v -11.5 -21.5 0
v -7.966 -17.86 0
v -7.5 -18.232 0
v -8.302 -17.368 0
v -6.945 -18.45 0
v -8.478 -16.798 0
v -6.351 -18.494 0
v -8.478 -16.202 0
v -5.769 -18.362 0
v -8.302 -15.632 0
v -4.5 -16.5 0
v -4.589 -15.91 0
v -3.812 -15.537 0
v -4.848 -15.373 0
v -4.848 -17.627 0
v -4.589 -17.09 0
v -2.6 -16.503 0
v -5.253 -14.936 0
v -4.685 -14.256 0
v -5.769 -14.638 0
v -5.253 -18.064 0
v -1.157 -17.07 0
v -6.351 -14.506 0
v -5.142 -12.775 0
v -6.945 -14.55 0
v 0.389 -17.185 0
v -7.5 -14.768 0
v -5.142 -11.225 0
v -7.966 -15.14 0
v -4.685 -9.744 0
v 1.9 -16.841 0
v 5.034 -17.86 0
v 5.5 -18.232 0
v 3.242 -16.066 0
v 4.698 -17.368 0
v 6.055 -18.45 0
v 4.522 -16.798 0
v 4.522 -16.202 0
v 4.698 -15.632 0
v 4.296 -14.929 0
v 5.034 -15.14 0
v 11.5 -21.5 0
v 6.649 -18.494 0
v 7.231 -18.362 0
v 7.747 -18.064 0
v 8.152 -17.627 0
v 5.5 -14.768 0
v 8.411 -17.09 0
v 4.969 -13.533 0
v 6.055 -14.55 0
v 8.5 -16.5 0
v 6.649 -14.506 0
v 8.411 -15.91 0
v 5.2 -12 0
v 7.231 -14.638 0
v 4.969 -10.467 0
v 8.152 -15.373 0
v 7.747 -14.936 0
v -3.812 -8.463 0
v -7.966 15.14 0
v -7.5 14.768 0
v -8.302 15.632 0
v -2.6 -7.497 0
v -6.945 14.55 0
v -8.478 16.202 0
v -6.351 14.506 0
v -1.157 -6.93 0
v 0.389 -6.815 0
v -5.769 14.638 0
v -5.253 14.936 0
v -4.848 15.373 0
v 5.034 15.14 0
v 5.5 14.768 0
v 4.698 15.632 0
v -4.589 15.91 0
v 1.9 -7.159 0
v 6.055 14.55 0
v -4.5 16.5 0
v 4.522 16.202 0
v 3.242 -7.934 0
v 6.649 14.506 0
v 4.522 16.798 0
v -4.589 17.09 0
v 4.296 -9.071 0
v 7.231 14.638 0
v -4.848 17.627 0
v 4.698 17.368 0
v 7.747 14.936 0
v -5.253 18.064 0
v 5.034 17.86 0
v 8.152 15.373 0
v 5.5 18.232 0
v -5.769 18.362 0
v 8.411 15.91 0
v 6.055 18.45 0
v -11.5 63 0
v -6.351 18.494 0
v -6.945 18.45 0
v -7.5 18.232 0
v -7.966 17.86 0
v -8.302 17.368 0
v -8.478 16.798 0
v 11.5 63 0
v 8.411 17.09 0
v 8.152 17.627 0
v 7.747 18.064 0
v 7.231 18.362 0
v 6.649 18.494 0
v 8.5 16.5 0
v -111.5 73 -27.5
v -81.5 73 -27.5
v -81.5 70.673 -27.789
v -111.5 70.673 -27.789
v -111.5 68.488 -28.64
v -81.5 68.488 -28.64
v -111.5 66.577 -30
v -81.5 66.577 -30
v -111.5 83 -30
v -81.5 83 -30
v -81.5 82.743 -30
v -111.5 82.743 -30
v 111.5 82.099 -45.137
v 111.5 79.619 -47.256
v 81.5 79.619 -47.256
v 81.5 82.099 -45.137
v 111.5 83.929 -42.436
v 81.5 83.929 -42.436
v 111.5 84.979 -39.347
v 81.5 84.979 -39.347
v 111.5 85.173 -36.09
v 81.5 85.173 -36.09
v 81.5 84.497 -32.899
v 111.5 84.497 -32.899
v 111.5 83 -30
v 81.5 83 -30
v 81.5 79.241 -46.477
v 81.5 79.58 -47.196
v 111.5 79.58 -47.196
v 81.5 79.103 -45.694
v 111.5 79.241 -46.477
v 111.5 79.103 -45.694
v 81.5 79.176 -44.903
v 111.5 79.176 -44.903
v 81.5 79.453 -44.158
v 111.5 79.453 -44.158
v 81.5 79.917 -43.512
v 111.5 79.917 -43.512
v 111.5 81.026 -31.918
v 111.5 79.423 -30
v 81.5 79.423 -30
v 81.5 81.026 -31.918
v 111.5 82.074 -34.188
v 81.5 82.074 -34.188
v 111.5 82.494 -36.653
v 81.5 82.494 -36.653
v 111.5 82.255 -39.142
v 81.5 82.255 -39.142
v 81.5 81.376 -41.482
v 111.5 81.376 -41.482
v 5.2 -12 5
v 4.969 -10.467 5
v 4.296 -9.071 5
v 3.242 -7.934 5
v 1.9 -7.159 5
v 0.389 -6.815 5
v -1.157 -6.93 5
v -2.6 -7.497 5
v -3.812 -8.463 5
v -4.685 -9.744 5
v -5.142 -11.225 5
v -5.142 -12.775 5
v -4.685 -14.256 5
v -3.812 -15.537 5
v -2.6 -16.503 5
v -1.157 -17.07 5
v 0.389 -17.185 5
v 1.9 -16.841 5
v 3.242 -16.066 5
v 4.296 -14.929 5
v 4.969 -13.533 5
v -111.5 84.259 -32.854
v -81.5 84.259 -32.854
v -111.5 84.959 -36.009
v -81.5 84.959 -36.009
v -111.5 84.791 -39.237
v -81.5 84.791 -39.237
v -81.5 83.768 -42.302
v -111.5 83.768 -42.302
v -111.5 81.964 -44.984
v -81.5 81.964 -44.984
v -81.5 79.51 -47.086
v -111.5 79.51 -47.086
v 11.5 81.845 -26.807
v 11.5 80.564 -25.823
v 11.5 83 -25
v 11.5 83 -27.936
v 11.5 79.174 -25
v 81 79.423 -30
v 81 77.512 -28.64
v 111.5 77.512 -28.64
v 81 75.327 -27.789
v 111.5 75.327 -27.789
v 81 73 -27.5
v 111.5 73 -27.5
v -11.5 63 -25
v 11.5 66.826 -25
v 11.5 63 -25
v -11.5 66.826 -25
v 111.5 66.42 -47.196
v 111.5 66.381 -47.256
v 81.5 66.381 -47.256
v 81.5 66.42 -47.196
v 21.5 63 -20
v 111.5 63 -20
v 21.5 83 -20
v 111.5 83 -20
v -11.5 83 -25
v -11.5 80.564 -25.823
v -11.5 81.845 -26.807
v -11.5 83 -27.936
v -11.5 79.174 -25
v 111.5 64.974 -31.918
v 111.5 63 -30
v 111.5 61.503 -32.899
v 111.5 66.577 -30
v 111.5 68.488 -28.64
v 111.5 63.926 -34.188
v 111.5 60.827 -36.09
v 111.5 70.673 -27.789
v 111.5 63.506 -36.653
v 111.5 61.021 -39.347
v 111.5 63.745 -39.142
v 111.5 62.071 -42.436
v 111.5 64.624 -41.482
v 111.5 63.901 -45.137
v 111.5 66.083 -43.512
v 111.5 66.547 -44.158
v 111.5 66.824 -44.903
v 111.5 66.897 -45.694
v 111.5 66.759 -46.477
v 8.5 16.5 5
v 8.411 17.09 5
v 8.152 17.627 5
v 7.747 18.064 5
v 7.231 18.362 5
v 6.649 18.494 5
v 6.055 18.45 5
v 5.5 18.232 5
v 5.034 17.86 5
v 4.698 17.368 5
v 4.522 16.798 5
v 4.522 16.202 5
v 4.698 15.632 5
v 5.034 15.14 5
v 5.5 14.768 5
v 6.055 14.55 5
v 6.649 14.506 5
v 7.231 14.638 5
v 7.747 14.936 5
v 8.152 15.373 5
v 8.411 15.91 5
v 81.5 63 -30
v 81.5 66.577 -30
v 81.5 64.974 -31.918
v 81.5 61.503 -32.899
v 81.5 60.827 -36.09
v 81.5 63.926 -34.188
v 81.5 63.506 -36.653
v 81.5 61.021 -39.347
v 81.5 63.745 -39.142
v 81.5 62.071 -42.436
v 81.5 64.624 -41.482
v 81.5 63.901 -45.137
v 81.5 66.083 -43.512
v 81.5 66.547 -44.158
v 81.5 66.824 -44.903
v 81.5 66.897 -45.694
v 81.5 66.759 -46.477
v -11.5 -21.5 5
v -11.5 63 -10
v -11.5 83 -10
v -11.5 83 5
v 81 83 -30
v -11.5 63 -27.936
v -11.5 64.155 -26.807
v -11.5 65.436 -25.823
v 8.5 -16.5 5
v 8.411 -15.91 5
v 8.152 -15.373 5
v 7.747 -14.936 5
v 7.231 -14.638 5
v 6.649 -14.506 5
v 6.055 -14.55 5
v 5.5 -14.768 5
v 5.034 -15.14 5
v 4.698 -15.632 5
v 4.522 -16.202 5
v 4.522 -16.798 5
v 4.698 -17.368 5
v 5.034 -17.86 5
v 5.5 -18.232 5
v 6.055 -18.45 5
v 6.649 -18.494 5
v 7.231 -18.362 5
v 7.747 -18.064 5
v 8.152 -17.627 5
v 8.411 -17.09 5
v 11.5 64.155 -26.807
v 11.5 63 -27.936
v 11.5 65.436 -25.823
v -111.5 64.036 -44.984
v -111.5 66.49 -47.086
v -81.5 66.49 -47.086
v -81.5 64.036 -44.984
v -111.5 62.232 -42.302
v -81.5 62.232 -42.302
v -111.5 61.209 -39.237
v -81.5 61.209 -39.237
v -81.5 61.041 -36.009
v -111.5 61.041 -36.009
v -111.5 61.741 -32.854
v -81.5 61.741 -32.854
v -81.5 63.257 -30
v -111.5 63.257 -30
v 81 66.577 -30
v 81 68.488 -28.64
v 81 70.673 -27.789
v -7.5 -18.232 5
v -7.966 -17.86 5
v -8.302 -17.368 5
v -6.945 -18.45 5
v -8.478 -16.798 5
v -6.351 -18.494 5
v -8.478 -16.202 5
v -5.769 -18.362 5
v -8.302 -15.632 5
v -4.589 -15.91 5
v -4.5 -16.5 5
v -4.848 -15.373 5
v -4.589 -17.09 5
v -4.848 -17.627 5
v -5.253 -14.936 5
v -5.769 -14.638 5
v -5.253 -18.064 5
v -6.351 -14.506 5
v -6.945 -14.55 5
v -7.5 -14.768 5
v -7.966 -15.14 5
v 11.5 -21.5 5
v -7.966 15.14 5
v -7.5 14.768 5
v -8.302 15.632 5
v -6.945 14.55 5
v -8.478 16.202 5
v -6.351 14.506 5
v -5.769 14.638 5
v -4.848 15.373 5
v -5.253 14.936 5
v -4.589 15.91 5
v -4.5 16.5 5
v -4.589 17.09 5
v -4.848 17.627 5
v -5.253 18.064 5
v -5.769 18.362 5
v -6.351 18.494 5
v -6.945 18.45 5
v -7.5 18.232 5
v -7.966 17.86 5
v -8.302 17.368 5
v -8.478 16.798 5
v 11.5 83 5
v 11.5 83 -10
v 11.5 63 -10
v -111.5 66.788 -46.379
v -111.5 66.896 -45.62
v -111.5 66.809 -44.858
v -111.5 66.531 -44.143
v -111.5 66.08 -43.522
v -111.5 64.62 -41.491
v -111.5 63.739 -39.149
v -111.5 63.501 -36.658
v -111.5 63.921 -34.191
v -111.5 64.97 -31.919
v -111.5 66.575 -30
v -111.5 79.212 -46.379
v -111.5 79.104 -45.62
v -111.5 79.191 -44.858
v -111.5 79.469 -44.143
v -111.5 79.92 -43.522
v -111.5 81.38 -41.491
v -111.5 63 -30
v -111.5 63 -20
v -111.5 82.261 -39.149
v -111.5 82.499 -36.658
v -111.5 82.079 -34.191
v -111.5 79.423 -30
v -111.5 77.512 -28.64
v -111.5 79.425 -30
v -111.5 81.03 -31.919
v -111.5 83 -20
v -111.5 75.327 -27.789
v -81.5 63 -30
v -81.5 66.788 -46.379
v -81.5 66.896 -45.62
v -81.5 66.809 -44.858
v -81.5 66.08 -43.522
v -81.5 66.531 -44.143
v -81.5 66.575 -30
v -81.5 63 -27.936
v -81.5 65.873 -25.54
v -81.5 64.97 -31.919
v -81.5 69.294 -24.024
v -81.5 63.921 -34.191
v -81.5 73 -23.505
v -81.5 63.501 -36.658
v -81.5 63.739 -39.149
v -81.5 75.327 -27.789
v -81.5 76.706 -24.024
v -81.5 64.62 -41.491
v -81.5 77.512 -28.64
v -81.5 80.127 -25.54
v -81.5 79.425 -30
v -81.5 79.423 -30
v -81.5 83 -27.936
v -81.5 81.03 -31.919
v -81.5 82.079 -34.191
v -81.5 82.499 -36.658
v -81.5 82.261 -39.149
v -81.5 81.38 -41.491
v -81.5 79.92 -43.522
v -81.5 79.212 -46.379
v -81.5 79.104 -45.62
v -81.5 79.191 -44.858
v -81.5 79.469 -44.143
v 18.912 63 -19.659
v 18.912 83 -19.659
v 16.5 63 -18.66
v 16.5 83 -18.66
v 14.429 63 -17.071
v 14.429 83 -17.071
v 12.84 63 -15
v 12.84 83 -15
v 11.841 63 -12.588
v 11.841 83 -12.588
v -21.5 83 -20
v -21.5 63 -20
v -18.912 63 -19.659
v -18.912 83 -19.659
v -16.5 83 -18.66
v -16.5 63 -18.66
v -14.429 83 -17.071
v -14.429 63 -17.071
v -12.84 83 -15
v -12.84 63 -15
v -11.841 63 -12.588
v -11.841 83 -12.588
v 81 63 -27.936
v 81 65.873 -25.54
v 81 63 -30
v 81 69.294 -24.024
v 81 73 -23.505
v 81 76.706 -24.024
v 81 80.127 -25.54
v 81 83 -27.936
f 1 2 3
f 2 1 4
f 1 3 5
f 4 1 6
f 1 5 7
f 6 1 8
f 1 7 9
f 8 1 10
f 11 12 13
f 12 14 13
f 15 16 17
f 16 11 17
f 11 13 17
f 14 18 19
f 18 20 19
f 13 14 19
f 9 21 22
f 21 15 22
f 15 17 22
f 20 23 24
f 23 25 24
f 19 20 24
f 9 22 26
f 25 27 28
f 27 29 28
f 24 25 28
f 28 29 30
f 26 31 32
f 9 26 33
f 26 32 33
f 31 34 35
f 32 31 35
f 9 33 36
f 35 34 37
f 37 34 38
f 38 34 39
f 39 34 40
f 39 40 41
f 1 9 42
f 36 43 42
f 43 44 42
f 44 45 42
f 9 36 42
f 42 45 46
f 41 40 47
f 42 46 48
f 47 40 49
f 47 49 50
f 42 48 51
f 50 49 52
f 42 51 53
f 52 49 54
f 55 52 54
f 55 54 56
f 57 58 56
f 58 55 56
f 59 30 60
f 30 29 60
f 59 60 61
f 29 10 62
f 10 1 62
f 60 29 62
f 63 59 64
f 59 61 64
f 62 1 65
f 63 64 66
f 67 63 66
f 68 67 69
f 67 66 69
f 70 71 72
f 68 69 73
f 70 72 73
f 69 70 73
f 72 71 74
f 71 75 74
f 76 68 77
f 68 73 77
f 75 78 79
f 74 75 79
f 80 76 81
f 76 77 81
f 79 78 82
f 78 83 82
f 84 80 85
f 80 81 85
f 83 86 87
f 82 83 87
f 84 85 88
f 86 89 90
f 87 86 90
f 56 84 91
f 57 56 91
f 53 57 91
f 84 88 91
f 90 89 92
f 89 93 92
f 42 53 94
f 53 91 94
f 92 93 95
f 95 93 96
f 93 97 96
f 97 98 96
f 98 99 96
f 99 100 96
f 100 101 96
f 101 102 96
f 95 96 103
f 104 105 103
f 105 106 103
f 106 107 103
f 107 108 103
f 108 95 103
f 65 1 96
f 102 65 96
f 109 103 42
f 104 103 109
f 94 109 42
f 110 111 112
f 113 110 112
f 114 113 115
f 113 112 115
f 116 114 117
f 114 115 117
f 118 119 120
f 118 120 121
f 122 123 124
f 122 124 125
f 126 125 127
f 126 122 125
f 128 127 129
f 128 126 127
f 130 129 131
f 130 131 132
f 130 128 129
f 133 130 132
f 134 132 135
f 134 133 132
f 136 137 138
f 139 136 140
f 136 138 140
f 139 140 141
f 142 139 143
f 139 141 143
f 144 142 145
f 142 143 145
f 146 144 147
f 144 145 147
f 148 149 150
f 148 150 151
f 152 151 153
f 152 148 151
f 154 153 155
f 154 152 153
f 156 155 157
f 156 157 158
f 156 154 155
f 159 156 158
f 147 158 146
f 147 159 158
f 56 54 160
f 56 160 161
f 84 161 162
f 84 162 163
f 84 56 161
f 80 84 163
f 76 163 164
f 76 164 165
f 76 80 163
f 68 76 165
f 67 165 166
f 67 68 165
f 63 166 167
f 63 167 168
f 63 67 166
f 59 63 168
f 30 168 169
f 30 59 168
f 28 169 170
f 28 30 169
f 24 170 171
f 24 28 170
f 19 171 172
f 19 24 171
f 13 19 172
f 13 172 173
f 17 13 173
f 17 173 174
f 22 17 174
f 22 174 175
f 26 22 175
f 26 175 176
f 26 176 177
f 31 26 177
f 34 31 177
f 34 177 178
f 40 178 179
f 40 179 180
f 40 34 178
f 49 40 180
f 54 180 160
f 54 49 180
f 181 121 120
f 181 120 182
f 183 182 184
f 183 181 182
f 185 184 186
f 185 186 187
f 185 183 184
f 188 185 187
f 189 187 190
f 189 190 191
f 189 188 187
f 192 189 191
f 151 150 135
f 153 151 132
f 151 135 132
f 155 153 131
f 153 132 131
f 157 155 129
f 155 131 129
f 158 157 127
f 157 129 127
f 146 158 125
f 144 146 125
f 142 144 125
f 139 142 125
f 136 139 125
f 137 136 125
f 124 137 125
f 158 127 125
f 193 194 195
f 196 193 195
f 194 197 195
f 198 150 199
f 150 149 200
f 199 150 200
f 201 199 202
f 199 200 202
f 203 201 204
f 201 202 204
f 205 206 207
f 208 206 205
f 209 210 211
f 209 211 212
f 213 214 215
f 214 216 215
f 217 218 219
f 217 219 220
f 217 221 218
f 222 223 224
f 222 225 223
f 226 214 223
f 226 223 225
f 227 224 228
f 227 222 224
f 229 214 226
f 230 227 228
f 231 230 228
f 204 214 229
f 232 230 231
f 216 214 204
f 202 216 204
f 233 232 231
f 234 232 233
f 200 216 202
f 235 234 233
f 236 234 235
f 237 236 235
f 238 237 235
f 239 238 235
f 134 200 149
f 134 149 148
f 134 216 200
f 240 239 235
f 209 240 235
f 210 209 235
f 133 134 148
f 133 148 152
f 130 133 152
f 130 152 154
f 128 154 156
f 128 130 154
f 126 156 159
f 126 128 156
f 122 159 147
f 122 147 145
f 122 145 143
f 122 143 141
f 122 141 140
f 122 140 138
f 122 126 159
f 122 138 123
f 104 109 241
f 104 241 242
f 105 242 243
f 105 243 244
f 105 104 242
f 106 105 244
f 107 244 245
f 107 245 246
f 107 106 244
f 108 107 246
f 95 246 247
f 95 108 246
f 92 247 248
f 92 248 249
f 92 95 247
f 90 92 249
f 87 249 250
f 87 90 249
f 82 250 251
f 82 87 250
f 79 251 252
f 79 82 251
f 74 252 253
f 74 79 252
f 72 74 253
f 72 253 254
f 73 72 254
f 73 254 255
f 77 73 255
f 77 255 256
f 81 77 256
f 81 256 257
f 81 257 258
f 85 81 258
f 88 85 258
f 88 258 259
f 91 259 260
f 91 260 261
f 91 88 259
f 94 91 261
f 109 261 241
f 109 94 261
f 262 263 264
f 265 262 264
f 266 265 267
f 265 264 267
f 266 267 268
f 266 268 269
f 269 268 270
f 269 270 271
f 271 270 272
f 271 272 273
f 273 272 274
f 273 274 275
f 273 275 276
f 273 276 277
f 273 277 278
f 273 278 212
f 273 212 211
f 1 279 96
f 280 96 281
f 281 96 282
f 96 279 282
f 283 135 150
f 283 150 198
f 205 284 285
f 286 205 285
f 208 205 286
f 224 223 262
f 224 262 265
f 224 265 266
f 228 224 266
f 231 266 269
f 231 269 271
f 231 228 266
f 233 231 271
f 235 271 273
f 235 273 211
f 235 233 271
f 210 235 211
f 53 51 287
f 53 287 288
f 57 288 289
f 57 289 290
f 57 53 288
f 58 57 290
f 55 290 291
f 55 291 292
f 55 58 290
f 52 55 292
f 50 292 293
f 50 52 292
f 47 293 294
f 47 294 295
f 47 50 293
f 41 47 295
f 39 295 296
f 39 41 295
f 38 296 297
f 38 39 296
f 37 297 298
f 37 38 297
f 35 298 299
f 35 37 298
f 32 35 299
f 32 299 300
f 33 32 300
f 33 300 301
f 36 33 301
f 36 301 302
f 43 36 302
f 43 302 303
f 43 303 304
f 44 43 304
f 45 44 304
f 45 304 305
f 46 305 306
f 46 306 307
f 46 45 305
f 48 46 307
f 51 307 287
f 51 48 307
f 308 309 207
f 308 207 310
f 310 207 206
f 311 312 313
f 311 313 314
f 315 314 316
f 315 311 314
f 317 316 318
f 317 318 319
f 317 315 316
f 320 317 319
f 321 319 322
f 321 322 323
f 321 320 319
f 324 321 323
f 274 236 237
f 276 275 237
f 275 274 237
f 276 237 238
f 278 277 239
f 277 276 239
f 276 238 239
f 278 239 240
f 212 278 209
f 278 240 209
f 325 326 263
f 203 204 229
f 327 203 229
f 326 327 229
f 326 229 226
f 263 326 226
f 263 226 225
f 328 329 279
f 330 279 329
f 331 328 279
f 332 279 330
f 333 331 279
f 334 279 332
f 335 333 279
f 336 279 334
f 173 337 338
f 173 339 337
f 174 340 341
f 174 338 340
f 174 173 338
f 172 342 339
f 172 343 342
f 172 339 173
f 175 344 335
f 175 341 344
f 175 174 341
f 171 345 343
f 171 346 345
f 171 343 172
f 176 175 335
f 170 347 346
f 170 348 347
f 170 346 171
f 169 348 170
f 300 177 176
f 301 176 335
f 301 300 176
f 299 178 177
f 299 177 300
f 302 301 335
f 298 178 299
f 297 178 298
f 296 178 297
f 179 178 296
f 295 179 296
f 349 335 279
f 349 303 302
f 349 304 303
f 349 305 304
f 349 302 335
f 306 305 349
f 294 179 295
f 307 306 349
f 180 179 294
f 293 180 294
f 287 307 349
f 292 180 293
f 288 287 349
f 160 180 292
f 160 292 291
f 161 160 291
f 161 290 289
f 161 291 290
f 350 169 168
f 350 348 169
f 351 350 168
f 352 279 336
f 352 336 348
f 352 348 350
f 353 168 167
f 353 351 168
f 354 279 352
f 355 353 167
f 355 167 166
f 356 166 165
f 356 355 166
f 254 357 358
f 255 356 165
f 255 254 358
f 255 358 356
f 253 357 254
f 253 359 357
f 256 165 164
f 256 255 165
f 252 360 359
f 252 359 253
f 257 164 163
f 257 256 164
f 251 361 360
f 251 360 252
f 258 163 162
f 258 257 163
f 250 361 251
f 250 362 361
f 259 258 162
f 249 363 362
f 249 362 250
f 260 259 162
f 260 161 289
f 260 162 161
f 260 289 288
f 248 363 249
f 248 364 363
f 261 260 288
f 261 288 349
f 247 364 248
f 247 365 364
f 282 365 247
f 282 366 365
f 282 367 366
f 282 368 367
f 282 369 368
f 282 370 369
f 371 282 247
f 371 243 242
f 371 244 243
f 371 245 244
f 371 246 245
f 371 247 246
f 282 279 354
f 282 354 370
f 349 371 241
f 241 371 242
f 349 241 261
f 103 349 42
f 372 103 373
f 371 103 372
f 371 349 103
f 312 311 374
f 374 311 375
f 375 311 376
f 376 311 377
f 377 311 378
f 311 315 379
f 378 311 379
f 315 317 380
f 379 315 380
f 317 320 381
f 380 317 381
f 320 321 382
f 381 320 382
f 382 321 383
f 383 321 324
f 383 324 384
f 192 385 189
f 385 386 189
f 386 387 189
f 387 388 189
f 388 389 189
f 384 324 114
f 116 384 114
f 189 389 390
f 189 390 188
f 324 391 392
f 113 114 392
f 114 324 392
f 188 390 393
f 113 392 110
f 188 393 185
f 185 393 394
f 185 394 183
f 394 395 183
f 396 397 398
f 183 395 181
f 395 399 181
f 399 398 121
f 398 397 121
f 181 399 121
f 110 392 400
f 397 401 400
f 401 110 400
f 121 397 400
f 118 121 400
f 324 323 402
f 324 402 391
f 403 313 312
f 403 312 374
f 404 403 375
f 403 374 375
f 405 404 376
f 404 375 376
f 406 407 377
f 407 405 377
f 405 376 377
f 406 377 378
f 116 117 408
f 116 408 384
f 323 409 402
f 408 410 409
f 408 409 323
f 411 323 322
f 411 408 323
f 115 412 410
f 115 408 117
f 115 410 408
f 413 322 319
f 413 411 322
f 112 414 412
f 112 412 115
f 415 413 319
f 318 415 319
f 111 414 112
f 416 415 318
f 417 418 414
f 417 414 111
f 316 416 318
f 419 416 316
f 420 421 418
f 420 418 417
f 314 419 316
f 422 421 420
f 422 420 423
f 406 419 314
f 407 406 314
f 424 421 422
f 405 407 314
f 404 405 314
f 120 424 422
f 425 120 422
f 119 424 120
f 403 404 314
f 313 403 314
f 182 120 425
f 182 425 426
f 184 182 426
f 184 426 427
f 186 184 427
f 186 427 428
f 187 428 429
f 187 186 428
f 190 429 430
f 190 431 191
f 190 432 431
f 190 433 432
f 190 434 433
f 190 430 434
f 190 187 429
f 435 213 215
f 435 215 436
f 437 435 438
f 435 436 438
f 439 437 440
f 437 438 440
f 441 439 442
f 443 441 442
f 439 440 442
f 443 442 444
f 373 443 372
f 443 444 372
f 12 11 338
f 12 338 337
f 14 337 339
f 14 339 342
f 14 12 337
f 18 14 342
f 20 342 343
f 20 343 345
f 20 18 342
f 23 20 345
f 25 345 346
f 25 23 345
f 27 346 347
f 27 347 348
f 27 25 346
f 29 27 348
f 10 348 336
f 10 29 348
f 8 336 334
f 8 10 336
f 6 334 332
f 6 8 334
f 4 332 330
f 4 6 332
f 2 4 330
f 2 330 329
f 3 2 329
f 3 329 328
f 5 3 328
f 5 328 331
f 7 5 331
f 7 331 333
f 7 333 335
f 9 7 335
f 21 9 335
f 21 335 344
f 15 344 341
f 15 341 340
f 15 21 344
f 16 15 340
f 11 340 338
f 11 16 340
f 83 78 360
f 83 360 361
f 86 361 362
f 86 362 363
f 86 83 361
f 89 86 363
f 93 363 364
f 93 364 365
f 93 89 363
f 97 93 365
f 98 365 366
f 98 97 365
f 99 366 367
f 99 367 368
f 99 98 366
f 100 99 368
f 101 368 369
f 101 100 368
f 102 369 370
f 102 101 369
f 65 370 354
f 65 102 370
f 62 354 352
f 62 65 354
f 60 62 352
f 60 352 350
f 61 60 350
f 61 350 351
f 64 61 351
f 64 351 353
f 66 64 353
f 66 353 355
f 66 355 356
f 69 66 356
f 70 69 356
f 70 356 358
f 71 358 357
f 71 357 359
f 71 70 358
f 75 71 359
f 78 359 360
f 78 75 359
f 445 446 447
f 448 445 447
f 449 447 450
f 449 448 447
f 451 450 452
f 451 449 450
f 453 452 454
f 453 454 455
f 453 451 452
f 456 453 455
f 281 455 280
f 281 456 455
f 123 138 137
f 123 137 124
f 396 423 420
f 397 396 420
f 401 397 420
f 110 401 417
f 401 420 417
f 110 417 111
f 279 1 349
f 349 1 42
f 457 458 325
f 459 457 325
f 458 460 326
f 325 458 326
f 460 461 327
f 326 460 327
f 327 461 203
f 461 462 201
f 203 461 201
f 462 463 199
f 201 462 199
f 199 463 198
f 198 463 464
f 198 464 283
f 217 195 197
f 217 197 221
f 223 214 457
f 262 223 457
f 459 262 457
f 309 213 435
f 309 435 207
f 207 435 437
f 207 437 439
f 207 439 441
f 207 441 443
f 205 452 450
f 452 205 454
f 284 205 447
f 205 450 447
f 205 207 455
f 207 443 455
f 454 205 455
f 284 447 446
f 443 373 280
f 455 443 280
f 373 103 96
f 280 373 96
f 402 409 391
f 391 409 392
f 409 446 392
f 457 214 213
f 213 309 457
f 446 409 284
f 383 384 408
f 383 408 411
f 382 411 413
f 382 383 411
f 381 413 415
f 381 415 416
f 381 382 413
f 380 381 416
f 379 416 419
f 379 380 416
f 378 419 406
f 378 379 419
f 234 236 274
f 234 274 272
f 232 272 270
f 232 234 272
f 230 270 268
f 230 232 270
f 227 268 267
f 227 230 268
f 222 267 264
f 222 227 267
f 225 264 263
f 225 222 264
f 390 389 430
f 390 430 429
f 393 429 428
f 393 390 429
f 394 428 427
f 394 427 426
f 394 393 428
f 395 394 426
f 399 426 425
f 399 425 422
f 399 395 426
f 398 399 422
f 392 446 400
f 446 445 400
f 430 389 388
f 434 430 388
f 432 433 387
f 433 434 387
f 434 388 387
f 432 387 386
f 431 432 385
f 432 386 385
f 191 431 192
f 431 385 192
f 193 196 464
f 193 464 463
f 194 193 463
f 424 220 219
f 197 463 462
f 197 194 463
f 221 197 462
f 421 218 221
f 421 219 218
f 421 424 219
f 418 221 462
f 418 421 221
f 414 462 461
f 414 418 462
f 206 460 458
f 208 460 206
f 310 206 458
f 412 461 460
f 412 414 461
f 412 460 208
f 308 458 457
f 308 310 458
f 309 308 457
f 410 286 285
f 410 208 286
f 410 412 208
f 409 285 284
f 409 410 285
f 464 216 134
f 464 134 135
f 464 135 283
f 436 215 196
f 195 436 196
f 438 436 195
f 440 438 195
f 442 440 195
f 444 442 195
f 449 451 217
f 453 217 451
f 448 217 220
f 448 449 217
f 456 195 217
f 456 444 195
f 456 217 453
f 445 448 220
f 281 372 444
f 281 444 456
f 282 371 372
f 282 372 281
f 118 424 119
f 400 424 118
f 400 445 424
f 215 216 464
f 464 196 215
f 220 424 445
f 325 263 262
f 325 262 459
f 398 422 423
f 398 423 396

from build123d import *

# Parameters (mm, degrees)
SKETCH1_W           = 23
SKETCH1_H           = 104.5
SKETCH1_R           = 2
SKETCH1_R_2         = 5.2
BOSS_EXTRUDE1_DEPTH = 5
SKETCH2_W           = 23
SKETCH2_H           = 20
BOSS_EXTRUDE2_DEPTH = 20
SKETCH3_W           = 23
SKETCH3_H           = 20
BOSS_EXTRUDE3_DEPTH = 5
SKETCH3_3_W         = 100
SKETCH3_3_H         = 20
BOSS_EXTRUDE4_DEPTH = 10
BOSS_EXTRUDE5_DEPTH = 30
BOSS_EXTRUDE6_DEPTH = 30
FILLET1_R           = 10
CUT_EXTRUDE1_DEPTH  = 300
SKETCH6_R           = 13.5
CUT_EXTRUDE2_DEPTH  = 162.5
FILLET5_R           = 3


with BuildPart() as part:
    # Sketch1 → Boss-Extrude1 (new body)
    with BuildSketch(Plane.XY):
        with Locations((0, 30.75)):
            Rectangle(SKETCH1_W, SKETCH1_H)
        with Locations((6.5, 16.5)):
            Circle(SKETCH1_R, mode=Mode.SUBTRACT)
        with Locations((6.5, -16.5)):
            Circle(SKETCH1_R, mode=Mode.SUBTRACT)
        with Locations((0, -12)):
            Circle(SKETCH1_R_2, mode=Mode.SUBTRACT)
        with Locations((-6.5, -16.5)):
            Circle(SKETCH1_R, mode=Mode.SUBTRACT)
        with Locations((-6.5, 16.5)):
            Circle(SKETCH1_R, mode=Mode.SUBTRACT)
    extrude(amount=BOSS_EXTRUDE1_DEPTH)

    # Sketch2 → Boss-Extrude2 (add)
    with BuildSketch(Plane(origin=(0, 0, 0), x_dir=(-1, 0, 0), z_dir=(0, 0, -1))):
        with Locations((0, 73)):
            Rectangle(SKETCH2_W, SKETCH2_H)
    extrude(amount=BOSS_EXTRUDE2_DEPTH)

    # Sketch3 → Boss-Extrude3 (add)
    with BuildSketch(Plane(origin=(0, 0, -20), x_dir=(-1, 0, 0), z_dir=(0, 0, -1))):
        with Locations((0, 73)):
            Rectangle(SKETCH3_W, SKETCH3_H)
    extrude(amount=BOSS_EXTRUDE3_DEPTH)

    # Sketch3<3> → Boss-Extrude4 (add)
    with BuildSketch(Plane(origin=(0, 0, -20), x_dir=(-1, 0, 0), z_dir=(0, 0, -1))):
        with Locations((-61.5, 73)):
            Rectangle(SKETCH3_3_W, SKETCH3_3_H)
        with Locations((61.5, 73)):
            Rectangle(SKETCH3_3_W, SKETCH3_3_H)
    extrude(amount=BOSS_EXTRUDE4_DEPTH)

    # Sketch4 → Boss-Extrude5 (add)
    with BuildSketch(Plane(origin=(111.5, 0, 0), x_dir=(0, 0, -1), z_dir=(1, 0, 0))):
        with BuildLine():
            Line((30, 83), (30, 79.422616289))
            ThreePointArc((30, 79.422616289), (37.803170415, 82.465987391), (44.982034231, 78.151420148))
            Line((44.982034231, 78.151420148), (47.256120501, 79.619062793))
            ThreePointArc((47.256120501, 79.619062793), (39.346969169, 84.978803601), (30, 83))
        make_face()
        with BuildLine():
            ThreePointArc((44.982034231, 67.848579852), (37.803170415, 63.534012609), (30, 66.577383711))
            Line((30, 66.577383711), (30, 63))
            ThreePointArc((30, 63), (39.346969169, 61.021196399), (47.256120501, 66.380937207))
            Line((47.256120501, 66.380937207), (44.982034231, 67.848579852))
        make_face()
    extrude(amount=-BOSS_EXTRUDE5_DEPTH)

    # Sketch5 → Boss-Extrude6 (add)
    with BuildSketch(Plane.ZY.offset(111.5)):
        with BuildLine():
            ThreePointArc((-44.99074033, 78.15631214), (-37.806835348, 82.471571982), (-30, 79.42472441))
            Line((-30, 79.42472441), (-30, 82.742901835))
            ThreePointArc((-30, 82.742901835), (-39.236660525, 84.790740062), (-47.086393259, 79.50952476))
            Line((-47.086393259, 79.50952476), (-44.99074033, 78.15631214))
        make_face()
        with BuildLine():
            Line((-30, 63.257098165), (-30, 66.57527559))
            ThreePointArc((-30, 66.57527559), (-37.806835348, 63.528428018), (-44.99074033, 67.84368786))
            Line((-44.99074033, 67.84368786), (-47.086393259, 66.49047524))
            ThreePointArc((-47.086393259, 66.49047524), (-39.236660525, 61.209259938), (-30, 63.257098165))
        make_face()
    extrude(amount=-BOSS_EXTRUDE6_DEPTH)

    # Fillet1
    fillet1_edges = [part.edges().sort_by_distance(p)[0] for p in [
        (11.5, 73, -20),
        (-11.5, 73, -20),
    ]]
    fillet(fillet1_edges, radius=FILLET1_R)

    # Sketch4<3> → Cut-Extrude1 (cut)
    with BuildSketch(Plane(origin=(111.5, 0, 0), x_dir=(0, 0, -1), z_dir=(1, 0, 0))):
        with BuildLine():
            Line((30, 66.577383711), (30, 73))
            Line((30, 73), (27.5, 73))
            ThreePointArc((27.5, 73), (28.147034395, 69.553987812), (30, 66.577383711))
        make_face()
        with BuildLine():
            Line((27.5, 73), (30, 73))
            Line((30, 73), (30, 79.422616289))
            ThreePointArc((30, 79.422616289), (28.147034395, 76.446012188), (27.5, 73))
        make_face()
    extrude(amount=-CUT_EXTRUDE1_DEPTH, mode=Mode.SUBTRACT)

    # Sketch6 → Cut-Extrude2 (cut)
    with BuildSketch(Plane(origin=(-81.5, 0, 0), x_dir=(0, 0, -1), z_dir=(1, 0, 0))):
        with Locations((37.005416749, 73)):
            Circle(SKETCH6_R)
    extrude(amount=CUT_EXTRUDE2_DEPTH, mode=Mode.SUBTRACT)

    # Fillet5
    # the kernel refuses this fillet: 3 mm, written as the material it takes off along each edge
    with BuildSketch(Plane(origin=(118.086652749, 67.848579852, -44.982034231), x_dir=(0, -0.768500975054365, 0.6398486159557513), z_dir=(-1, 0, 0))) as fillet5_piece_1:
        with BuildLine():
            CenterArc((2.659503922, -2.977998992), FILLET5_R, 96.943270181, 76.113459637)
            Line((-0.318495069, -2.615339366), (-0.378055049, -2.608086174))
            Line((-0.378055049, -2.608086174), (-0.05955998, 0.007253193))
            Line((-0.05955998, 0.007253193), (0.007253193, 0.05955998))
            ThreePointArc((0.007253193, 0.05955998), (1.148422148, -0.009669859), (2.289591104, 0.05955998))
            Line((2.289591104, 0.05955998), (2.296844297, 0))
        make_face()
    extrude(amount=43.173305498, mode=Mode.SUBTRACT)
    with BuildSketch(Plane(origin=(-117.736458127, 67.84368786, -44.99074033), x_dir=(0, -0.5424603966463132, -0.8400813758620795), z_dir=(1, 0, 0))) as fillet5_piece_2:
        with BuildLine():
            CenterArc((2.635643587, -2.996681829), FILLET5_R, 92.695047673, 73.440207037)
            Line((-0.276948751, -2.277789714), (-0.335200598, -2.263411872))
            ThreePointArc((-0.335200598, -2.263411872), (-0.129052561, -1.140040424), (-0.06, 0))
            Line((-0.06, 0), (0, 0.06))
            ThreePointArc((0, 0.06), (1.247291625, 0.06), (2.491762044, 0.059933637))
            Line((2.491762044, 0.059933637), (2.494583251, 0))
        make_face()
    extrude(amount=42.472916254, mode=Mode.SUBTRACT)
    with BuildSketch(Plane(origin=(-117.736458127, 78.15631214, -44.99074033), x_dir=(0, 0.7684660550632233, 0.6398905548729151), z_dir=(1, 0, 0))) as fillet5_piece_3:
        with BuildLine():
            CenterArc((2.656657786, -2.978067915), FILLET5_R, 96.932372645, 73.440207037)
            Line((-0.301090552, -2.476346114), (-0.360245519, -2.466311678))
            ThreePointArc((-0.360245519, -2.466311678), (-0.210106634, -1.230931193), (-0.059561358, 0.007241864))
            Line((-0.059561358, 0.007241864), (0.007241864, 0.059561358))
            ThreePointArc((0.007241864, 0.059561358), (1.147282288, -0.009491202), (2.287322712, 0.059561358))
            Line((2.287322712, 0.059561358), (2.294564576, 0))
        make_face()
    extrude(amount=42.472916254, mode=Mode.SUBTRACT)
    with BuildSketch(Plane(origin=(118.086652749, 78.151420148, -44.982034231), x_dir=(0, 0.5422547524206679, -0.8402141295391314), z_dir=(-1, 0, 0))) as fillet5_piece_4:
        with BuildLine():
            CenterArc((2.6346611, -3), FILLET5_R, 90, 76.113459637)
            Line((-0.277657564, -2.28), (-0.335903938, -2.2656))
            ThreePointArc((-0.335903938, -2.2656), (-0.129229839, -1.141168956), (-0.06, 0))
            Line((-0.06, 0), (0, 0.06))
            Line((0, 0.06), (2.6346611, 0.06))
            Line((2.6346611, 0.06), (2.6346611, 0))
        make_face()
    extrude(amount=43.173305498, mode=Mode.SUBTRACT)


solid = part.part
